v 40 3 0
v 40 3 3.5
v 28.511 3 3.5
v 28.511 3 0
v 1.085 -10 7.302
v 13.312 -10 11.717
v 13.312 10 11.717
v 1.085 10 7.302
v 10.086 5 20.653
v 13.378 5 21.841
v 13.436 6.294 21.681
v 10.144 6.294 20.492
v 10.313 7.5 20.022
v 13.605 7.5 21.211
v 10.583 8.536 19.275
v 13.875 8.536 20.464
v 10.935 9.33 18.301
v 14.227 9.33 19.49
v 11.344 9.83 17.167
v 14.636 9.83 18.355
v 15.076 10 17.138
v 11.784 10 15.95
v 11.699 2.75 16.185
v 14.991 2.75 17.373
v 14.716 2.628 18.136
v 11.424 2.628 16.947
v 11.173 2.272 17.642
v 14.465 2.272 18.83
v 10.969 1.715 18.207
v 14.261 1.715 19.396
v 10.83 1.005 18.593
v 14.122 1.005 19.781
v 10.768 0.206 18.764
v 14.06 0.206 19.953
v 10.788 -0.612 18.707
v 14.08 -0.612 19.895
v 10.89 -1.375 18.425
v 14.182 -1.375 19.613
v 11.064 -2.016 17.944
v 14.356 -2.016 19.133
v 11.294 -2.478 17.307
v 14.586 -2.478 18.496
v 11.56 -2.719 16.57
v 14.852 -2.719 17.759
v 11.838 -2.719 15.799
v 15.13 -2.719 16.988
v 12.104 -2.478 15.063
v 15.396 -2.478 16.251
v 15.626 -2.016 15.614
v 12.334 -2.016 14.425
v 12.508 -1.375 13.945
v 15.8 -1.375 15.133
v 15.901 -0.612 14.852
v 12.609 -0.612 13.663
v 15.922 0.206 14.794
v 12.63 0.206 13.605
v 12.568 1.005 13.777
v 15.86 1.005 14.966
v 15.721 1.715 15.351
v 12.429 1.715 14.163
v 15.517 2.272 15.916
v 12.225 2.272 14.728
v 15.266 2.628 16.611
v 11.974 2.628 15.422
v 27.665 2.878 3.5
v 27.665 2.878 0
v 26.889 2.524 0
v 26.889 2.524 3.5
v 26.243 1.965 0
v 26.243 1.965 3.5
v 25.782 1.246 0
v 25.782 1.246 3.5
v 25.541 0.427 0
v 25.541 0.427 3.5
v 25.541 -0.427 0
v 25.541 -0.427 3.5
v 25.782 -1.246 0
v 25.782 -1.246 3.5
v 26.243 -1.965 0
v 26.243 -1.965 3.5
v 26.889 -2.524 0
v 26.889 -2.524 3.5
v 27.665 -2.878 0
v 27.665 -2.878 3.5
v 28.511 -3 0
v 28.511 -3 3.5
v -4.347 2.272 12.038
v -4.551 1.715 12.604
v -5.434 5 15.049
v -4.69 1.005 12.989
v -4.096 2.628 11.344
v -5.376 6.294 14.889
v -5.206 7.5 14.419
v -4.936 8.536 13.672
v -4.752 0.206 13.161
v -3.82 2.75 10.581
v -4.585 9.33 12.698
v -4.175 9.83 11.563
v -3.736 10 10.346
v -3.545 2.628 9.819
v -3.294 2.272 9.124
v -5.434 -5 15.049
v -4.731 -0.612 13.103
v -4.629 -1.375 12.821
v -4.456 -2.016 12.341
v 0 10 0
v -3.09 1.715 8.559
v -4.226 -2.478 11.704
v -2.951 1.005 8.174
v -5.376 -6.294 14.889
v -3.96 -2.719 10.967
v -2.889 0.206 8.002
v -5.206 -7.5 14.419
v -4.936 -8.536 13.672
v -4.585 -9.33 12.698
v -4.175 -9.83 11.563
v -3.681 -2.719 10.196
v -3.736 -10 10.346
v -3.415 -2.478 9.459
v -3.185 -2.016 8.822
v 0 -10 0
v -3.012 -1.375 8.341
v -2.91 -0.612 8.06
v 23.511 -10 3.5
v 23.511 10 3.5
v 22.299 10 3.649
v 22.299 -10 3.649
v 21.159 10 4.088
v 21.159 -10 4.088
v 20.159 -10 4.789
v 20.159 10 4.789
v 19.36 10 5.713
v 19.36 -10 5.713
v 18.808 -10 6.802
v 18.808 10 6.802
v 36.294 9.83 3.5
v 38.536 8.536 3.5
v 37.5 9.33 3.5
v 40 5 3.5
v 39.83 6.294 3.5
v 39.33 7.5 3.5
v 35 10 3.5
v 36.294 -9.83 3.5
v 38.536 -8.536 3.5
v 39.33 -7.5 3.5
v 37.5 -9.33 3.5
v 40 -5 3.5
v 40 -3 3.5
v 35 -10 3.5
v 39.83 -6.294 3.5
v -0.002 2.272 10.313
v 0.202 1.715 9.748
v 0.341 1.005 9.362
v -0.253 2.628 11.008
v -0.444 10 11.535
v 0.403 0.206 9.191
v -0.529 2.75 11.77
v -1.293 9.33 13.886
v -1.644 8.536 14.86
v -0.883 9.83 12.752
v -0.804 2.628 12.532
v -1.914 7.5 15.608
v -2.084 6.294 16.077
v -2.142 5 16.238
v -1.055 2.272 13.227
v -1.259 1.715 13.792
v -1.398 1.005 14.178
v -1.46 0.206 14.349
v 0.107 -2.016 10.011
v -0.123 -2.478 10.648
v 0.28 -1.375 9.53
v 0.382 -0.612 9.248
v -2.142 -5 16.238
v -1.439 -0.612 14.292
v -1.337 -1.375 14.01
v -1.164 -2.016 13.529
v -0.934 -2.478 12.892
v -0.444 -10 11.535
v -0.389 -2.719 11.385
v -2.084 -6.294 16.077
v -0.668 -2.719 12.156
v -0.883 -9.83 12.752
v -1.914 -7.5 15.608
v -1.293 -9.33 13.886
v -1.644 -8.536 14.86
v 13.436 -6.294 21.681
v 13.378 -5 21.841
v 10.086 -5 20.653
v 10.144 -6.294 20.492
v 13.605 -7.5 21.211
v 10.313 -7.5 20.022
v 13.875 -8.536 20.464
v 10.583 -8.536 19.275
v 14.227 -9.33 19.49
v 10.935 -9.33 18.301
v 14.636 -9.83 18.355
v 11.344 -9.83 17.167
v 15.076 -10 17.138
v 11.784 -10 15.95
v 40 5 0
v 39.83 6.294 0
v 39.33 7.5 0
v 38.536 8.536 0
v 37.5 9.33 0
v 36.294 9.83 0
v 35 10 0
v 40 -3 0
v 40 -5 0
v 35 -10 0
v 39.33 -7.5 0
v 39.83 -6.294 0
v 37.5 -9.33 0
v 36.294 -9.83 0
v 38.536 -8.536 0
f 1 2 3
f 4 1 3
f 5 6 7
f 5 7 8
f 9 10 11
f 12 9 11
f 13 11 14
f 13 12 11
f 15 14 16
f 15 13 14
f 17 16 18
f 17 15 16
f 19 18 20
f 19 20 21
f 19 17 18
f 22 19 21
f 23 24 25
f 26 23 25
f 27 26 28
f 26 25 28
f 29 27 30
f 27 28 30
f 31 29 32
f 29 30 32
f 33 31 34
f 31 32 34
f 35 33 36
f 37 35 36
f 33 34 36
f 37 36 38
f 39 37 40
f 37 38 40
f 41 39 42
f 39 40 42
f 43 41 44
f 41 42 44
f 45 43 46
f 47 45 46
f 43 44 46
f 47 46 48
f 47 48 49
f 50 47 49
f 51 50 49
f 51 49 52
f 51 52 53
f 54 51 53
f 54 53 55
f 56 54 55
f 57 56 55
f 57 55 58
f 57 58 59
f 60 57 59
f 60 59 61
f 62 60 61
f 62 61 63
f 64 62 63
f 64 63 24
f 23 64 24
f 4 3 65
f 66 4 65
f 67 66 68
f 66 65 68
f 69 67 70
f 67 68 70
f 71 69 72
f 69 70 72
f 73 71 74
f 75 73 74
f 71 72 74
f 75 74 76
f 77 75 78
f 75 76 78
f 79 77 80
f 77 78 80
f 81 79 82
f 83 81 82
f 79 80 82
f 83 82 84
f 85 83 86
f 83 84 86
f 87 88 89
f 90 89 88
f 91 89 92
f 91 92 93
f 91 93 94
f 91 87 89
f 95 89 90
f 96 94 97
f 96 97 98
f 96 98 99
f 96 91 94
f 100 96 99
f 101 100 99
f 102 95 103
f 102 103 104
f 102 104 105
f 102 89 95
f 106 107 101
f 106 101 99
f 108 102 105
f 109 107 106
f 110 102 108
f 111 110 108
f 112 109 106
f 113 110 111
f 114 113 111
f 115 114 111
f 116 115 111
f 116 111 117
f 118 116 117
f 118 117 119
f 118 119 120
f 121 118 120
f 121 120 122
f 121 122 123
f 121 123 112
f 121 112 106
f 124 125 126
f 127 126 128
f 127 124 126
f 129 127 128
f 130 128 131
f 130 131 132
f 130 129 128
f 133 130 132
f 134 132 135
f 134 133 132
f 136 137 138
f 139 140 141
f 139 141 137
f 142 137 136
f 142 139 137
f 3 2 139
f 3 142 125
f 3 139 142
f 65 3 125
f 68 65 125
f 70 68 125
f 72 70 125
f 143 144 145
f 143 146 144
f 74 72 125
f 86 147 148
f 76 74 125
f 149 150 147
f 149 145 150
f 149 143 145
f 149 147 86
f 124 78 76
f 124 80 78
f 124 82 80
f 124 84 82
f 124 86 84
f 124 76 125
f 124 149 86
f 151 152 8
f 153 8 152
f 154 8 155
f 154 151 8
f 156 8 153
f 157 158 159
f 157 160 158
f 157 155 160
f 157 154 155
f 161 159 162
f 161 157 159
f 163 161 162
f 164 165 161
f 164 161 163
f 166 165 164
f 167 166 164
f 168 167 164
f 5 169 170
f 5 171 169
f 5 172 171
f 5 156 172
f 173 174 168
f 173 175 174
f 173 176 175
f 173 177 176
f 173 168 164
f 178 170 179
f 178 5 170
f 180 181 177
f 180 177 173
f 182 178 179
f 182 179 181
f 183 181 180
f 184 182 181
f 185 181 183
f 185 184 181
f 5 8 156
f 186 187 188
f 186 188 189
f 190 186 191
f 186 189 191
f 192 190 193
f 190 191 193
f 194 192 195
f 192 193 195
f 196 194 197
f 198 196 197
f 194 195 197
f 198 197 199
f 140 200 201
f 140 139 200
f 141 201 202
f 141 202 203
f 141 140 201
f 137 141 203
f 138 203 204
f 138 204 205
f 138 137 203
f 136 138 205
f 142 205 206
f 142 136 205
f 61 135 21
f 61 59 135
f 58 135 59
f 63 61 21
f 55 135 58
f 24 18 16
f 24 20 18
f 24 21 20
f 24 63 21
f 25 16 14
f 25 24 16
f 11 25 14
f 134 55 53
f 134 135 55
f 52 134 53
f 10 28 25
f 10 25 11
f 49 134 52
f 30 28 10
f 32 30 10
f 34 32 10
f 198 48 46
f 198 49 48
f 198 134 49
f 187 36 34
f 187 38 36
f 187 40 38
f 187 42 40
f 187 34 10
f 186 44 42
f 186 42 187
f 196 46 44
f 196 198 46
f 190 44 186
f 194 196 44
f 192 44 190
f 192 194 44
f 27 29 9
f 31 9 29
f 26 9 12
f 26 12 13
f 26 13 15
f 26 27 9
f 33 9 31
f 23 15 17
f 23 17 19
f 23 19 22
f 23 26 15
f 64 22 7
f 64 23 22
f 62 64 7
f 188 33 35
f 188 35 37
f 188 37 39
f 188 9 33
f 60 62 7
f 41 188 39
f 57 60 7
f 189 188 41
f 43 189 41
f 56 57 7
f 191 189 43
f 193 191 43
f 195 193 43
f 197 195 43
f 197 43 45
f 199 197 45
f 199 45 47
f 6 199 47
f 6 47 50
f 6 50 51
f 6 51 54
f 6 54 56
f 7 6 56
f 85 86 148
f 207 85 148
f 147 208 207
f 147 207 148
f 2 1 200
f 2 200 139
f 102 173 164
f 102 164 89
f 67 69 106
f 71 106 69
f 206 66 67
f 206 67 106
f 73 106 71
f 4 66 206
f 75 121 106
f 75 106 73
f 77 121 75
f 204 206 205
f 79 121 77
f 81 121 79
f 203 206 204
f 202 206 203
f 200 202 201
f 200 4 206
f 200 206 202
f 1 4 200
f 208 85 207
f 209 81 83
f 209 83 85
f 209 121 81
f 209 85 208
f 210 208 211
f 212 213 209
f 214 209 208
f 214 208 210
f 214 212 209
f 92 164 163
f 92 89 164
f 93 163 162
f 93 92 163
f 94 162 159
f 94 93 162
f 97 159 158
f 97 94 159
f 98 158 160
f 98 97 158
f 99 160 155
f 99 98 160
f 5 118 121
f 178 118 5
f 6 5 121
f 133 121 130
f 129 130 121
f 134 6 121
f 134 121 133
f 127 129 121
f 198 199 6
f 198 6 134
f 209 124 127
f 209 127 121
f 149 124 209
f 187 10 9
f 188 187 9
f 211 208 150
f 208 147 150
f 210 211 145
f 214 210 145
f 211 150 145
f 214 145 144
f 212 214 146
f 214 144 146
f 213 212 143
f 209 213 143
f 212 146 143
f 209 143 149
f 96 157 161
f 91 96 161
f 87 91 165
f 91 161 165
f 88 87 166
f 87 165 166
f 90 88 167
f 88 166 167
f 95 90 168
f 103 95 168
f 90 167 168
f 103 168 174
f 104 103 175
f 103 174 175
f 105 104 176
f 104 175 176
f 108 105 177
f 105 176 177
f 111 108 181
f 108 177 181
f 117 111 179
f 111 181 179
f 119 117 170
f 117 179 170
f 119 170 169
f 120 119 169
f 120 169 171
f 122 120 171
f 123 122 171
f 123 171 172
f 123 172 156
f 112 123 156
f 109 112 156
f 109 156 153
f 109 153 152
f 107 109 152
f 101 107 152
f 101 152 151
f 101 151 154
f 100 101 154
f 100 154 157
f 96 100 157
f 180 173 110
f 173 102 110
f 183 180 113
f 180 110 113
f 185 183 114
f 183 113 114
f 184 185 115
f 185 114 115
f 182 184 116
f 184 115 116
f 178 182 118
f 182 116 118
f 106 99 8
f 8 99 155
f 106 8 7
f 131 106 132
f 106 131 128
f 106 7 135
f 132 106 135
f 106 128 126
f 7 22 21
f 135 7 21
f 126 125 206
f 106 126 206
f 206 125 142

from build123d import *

# Parameters (mm, degrees)
F1_DEPTH = 10
F2_R     = 5
F3_R     = 2.75
F4_DEPTH = 20
F6_DEPTH = 3.5


with BuildPart() as f1:
    # F0 (on Front) → F1 (new body, symmetric)
    with BuildSketch(Plane.XZ):
        with BuildLine():
            Line((-5.4335961189, 15.0491206792), (0, 0))
            Line((0, 0), (40, 0))
            Line((40, 0), (40, 3.5))
            Line((40, 3.5), (23.5106382979, 3.5))
            ThreePointArc((23.5106382979, 3.5), (20.6374861905, 4.4079348774), (18.8077880856, 6.8020012129))
            Line((18.8077880856, 6.8020012129), (13.3778047301, 21.8411158278))
            Line((13.3778047301, 21.8411158278), (10.0858095816, 20.6525166768))
            Line((10.0858095816, 20.6525166768), (13.3120072771, 11.7171012735))
            Line((13.3120072771, 11.7171012735), (1.0845967253, 7.3023044269))
            Line((1.0845967253, 7.3023044269), (-2.1416009703, 16.2377198302))
            Line((-2.1416009703, 16.2377198302), (-5.4335961189, 15.0491206792))
        make_face()
    extrude(amount=F1_DEPTH, both=True)

    # F2
    f2_edges = [f1.edges().sort_by_distance(p)[0] for p in [
        (-3.787599, 10, 15.64342),
        (11.731807, 10, 21.246816),
        (11.731807, -10, 21.246816),
        (-3.787599, -10, 15.64342),
        (40, -10, 1.75),
        (40, 10, 1.75),
    ]]
    fillet(f2_edges, radius=F2_R)

    # F3 (on face) → F4 (cut, through all)
    with BuildSketch(Plane(origin=(18.811400849, 0, 6.7919951486), x_dir=(0, 1, 0), z_dir=(0.9405700424, 0, 0.3395997574))):
        with Locations((0, 11.25)):
            Circle(F3_R)
    extrude(amount=-F4_DEPTH, mode=Mode.SUBTRACT)

    # F5 (on face) → F6 (cut, through all)
    with BuildSketch(Plane.XY.offset(3.5)):
        with BuildLine():
            ThreePointArc((28.5106382979, -3), (30.6319586414, -2.1213203436), (31.5106382979, 0))
            ThreePointArc((31.5106382979, 0), (30.6319586414, 2.1213203436), (28.5106382979, 3))
            ThreePointArc((28.5106382979, 3), (25.5106382979, 0), (28.5106382979, -3))
        make_face()
        with BuildLine():
            ThreePointArc((28.5106382979, 3), (30.6319586414, 2.1213203436), (31.5106382979, 0))
            ThreePointArc((31.5106382979, 0), (30.6319586414, -2.1213203436), (28.5106382979, -3))
            Line((28.5106382979, -3), (40, -3))
            Line((40, -3), (40, 3))
            Line((40, 3), (28.5106382979, 3))
        make_face()
    extrude(amount=-F6_DEPTH, mode=Mode.SUBTRACT)


solid = f1.part
